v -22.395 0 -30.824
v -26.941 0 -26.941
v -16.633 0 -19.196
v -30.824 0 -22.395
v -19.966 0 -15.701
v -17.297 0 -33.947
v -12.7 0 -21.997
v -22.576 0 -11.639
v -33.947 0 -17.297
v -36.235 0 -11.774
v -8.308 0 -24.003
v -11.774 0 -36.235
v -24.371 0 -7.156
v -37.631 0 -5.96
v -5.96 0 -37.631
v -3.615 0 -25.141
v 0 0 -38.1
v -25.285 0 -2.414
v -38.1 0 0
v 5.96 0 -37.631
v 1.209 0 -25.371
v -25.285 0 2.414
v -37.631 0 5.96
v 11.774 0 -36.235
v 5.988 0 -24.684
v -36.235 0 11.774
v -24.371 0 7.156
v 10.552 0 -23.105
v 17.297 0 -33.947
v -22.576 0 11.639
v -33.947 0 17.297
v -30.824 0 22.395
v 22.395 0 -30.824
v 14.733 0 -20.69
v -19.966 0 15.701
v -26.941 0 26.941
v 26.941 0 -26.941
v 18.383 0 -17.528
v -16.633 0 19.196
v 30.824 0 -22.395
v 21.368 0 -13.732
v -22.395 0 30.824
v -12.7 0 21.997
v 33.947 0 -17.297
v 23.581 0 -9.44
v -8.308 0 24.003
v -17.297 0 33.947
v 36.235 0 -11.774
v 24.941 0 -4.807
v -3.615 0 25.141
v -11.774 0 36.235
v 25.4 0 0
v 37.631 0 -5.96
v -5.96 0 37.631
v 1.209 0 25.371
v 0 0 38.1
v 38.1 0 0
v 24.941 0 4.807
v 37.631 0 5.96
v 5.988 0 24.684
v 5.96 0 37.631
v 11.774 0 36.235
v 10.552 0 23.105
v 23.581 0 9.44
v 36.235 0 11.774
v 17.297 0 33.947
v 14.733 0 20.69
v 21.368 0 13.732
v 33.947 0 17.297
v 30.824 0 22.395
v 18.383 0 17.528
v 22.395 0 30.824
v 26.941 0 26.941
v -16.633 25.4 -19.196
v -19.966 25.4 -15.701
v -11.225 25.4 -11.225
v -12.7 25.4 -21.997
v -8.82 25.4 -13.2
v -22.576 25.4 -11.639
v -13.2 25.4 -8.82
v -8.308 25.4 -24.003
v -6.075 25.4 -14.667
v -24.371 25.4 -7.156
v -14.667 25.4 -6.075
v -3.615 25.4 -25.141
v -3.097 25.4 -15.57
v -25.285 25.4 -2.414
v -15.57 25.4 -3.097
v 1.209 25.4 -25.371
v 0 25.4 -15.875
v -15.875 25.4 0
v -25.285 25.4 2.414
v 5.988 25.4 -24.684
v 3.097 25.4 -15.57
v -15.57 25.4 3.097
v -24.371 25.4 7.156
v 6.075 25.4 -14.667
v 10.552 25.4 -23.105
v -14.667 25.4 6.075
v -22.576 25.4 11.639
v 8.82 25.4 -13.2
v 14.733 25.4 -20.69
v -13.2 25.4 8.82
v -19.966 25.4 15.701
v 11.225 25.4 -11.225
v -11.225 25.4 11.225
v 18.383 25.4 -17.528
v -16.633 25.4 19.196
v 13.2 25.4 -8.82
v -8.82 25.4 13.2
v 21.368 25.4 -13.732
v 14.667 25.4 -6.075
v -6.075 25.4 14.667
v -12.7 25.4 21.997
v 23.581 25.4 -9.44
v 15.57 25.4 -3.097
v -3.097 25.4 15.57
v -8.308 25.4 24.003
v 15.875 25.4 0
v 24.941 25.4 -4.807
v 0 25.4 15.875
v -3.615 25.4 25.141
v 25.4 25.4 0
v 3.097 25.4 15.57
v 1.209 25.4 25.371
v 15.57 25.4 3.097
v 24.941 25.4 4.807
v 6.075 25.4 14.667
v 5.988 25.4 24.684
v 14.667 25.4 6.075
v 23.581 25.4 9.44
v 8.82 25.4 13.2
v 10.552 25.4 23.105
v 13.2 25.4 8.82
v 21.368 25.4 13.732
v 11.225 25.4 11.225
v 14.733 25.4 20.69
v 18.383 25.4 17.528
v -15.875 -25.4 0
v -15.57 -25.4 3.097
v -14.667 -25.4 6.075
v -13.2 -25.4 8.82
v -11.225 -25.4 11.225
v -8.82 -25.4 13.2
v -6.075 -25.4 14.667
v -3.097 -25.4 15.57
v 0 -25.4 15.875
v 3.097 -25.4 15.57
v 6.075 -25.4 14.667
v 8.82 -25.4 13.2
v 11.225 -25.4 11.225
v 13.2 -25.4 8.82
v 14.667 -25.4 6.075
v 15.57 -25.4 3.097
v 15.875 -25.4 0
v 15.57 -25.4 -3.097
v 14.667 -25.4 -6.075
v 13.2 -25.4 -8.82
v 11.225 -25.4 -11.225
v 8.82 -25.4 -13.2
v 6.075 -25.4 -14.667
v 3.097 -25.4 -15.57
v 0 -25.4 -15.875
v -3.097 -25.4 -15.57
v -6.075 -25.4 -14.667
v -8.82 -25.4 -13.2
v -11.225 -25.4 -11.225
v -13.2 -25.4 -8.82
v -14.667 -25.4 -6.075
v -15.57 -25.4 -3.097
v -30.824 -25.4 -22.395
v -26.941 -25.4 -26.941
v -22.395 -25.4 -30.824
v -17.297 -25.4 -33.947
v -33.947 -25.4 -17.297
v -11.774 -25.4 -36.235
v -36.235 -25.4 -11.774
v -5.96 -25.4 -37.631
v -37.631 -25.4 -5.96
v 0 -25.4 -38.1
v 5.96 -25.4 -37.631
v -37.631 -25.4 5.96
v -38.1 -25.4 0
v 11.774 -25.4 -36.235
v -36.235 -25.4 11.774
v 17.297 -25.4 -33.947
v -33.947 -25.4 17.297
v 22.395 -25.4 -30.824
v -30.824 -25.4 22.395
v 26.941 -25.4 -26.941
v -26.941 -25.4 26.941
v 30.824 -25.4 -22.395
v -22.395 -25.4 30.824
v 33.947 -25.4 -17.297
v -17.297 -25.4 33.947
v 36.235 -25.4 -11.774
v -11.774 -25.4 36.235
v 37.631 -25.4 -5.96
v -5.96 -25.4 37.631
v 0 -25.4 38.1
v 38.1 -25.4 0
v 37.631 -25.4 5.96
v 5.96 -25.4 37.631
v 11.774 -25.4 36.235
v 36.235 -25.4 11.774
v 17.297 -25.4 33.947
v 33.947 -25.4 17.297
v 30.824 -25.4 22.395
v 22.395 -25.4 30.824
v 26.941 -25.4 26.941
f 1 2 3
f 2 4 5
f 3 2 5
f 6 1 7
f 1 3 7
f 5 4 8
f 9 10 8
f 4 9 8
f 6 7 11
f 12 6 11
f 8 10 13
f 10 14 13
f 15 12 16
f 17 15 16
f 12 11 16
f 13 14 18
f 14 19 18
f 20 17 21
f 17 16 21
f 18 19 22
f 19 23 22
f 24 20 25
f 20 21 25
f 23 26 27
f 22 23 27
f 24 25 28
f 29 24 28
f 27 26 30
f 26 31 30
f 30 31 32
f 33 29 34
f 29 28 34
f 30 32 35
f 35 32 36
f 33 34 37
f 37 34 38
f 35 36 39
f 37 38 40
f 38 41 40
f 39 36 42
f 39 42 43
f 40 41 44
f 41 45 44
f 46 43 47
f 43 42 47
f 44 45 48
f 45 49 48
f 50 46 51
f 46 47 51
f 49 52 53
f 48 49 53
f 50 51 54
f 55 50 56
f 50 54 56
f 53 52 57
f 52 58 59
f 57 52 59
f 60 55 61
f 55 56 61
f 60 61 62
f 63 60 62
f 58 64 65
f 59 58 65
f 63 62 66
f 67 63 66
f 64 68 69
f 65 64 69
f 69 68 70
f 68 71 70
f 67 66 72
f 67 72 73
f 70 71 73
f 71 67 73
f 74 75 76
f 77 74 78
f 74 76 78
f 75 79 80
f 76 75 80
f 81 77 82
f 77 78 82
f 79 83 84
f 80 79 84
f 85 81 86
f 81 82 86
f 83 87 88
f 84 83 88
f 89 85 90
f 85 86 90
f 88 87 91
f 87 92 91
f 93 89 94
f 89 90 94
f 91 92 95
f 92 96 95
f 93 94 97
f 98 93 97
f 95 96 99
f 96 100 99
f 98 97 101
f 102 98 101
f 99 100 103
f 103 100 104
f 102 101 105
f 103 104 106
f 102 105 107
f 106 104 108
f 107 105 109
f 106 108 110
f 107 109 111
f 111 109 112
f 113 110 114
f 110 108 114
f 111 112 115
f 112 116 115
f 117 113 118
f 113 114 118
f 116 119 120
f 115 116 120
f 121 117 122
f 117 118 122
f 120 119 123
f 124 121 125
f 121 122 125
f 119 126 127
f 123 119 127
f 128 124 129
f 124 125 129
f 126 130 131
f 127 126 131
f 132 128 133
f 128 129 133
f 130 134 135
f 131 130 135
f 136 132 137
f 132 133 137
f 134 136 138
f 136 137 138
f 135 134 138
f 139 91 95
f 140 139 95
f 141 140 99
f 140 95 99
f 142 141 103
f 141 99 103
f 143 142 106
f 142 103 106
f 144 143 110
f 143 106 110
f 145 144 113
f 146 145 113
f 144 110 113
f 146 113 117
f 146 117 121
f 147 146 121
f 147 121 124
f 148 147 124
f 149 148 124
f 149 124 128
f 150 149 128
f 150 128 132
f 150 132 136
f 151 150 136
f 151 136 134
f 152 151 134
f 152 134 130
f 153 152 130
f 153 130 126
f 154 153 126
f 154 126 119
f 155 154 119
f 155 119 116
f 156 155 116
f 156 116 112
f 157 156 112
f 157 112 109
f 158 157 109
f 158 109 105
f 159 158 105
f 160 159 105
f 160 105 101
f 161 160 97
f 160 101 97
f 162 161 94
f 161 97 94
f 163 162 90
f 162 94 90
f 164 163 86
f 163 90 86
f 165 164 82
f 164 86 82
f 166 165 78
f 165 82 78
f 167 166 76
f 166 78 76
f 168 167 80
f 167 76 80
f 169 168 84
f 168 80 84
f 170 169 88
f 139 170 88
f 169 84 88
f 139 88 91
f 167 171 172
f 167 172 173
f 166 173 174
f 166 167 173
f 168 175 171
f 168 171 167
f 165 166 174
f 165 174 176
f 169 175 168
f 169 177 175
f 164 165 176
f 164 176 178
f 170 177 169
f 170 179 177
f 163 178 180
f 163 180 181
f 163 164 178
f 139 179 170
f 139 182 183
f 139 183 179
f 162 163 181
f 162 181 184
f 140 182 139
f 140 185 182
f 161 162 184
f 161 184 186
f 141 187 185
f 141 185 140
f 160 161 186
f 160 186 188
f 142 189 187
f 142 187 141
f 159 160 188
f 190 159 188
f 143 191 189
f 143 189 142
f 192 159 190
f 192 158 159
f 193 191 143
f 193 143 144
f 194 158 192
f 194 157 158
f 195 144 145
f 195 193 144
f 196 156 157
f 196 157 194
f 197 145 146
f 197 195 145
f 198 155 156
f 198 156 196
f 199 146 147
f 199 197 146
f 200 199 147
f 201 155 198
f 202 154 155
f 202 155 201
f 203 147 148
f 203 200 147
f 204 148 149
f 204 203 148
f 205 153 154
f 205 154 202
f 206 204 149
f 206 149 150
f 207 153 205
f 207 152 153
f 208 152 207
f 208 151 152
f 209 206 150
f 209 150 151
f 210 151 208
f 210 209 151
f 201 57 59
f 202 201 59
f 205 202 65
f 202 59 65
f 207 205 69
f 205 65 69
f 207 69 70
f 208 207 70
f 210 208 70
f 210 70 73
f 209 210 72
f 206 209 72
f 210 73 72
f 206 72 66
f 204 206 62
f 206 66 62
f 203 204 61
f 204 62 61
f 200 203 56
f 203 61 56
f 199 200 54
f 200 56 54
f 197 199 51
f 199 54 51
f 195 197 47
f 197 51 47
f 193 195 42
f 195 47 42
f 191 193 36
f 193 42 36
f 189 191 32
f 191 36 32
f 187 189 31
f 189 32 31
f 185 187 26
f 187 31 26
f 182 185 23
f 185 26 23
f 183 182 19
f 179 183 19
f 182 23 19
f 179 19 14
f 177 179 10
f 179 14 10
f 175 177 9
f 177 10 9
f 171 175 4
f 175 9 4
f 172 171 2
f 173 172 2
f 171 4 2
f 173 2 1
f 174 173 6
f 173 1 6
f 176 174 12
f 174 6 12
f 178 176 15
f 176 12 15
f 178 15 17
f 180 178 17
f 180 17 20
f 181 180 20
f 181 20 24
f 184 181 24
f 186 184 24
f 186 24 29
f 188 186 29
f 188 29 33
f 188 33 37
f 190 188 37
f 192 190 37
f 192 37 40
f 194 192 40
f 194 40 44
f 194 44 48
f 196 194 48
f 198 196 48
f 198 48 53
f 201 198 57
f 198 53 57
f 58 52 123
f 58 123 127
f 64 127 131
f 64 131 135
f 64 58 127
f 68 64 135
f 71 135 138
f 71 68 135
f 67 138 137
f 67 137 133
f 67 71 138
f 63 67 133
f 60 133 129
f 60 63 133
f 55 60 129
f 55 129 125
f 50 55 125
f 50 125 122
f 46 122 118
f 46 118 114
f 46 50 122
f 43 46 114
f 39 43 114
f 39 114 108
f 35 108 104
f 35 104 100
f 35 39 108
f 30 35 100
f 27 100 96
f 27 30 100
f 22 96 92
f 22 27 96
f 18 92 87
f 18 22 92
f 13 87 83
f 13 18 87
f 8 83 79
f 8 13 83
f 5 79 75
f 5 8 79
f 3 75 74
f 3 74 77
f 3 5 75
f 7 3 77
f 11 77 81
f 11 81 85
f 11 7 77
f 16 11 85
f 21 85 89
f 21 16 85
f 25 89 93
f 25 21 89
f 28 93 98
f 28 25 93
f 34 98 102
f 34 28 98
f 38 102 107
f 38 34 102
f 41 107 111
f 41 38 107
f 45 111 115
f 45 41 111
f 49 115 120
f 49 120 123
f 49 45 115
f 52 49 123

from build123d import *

# Parameters (mm, degrees)
F0_R     = 38.1
F3_DEPTH = 25.4
F5_R     = 25.4
F6_DEPTH = 25.4
F8_D     = 31.75


with BuildPart() as f3:
    # F0 (on Front) → F3 (new body)
    with BuildSketch(Plane.XZ):
        Circle(F0_R)
    extrude(amount=F3_DEPTH)

    # F5 (on Front) → F6 (join)
    with BuildSketch(Plane.XZ):
        Circle(F5_R)
    extrude(amount=-F6_DEPTH)

    # F8 (through all)
    with Locations(Plane.XZ.offset(25.4)):
        with Locations((0, 0), (0, 0), (0, 0), (0, 0)):
            Hole(F8_D / 2)


solid = f3.part
